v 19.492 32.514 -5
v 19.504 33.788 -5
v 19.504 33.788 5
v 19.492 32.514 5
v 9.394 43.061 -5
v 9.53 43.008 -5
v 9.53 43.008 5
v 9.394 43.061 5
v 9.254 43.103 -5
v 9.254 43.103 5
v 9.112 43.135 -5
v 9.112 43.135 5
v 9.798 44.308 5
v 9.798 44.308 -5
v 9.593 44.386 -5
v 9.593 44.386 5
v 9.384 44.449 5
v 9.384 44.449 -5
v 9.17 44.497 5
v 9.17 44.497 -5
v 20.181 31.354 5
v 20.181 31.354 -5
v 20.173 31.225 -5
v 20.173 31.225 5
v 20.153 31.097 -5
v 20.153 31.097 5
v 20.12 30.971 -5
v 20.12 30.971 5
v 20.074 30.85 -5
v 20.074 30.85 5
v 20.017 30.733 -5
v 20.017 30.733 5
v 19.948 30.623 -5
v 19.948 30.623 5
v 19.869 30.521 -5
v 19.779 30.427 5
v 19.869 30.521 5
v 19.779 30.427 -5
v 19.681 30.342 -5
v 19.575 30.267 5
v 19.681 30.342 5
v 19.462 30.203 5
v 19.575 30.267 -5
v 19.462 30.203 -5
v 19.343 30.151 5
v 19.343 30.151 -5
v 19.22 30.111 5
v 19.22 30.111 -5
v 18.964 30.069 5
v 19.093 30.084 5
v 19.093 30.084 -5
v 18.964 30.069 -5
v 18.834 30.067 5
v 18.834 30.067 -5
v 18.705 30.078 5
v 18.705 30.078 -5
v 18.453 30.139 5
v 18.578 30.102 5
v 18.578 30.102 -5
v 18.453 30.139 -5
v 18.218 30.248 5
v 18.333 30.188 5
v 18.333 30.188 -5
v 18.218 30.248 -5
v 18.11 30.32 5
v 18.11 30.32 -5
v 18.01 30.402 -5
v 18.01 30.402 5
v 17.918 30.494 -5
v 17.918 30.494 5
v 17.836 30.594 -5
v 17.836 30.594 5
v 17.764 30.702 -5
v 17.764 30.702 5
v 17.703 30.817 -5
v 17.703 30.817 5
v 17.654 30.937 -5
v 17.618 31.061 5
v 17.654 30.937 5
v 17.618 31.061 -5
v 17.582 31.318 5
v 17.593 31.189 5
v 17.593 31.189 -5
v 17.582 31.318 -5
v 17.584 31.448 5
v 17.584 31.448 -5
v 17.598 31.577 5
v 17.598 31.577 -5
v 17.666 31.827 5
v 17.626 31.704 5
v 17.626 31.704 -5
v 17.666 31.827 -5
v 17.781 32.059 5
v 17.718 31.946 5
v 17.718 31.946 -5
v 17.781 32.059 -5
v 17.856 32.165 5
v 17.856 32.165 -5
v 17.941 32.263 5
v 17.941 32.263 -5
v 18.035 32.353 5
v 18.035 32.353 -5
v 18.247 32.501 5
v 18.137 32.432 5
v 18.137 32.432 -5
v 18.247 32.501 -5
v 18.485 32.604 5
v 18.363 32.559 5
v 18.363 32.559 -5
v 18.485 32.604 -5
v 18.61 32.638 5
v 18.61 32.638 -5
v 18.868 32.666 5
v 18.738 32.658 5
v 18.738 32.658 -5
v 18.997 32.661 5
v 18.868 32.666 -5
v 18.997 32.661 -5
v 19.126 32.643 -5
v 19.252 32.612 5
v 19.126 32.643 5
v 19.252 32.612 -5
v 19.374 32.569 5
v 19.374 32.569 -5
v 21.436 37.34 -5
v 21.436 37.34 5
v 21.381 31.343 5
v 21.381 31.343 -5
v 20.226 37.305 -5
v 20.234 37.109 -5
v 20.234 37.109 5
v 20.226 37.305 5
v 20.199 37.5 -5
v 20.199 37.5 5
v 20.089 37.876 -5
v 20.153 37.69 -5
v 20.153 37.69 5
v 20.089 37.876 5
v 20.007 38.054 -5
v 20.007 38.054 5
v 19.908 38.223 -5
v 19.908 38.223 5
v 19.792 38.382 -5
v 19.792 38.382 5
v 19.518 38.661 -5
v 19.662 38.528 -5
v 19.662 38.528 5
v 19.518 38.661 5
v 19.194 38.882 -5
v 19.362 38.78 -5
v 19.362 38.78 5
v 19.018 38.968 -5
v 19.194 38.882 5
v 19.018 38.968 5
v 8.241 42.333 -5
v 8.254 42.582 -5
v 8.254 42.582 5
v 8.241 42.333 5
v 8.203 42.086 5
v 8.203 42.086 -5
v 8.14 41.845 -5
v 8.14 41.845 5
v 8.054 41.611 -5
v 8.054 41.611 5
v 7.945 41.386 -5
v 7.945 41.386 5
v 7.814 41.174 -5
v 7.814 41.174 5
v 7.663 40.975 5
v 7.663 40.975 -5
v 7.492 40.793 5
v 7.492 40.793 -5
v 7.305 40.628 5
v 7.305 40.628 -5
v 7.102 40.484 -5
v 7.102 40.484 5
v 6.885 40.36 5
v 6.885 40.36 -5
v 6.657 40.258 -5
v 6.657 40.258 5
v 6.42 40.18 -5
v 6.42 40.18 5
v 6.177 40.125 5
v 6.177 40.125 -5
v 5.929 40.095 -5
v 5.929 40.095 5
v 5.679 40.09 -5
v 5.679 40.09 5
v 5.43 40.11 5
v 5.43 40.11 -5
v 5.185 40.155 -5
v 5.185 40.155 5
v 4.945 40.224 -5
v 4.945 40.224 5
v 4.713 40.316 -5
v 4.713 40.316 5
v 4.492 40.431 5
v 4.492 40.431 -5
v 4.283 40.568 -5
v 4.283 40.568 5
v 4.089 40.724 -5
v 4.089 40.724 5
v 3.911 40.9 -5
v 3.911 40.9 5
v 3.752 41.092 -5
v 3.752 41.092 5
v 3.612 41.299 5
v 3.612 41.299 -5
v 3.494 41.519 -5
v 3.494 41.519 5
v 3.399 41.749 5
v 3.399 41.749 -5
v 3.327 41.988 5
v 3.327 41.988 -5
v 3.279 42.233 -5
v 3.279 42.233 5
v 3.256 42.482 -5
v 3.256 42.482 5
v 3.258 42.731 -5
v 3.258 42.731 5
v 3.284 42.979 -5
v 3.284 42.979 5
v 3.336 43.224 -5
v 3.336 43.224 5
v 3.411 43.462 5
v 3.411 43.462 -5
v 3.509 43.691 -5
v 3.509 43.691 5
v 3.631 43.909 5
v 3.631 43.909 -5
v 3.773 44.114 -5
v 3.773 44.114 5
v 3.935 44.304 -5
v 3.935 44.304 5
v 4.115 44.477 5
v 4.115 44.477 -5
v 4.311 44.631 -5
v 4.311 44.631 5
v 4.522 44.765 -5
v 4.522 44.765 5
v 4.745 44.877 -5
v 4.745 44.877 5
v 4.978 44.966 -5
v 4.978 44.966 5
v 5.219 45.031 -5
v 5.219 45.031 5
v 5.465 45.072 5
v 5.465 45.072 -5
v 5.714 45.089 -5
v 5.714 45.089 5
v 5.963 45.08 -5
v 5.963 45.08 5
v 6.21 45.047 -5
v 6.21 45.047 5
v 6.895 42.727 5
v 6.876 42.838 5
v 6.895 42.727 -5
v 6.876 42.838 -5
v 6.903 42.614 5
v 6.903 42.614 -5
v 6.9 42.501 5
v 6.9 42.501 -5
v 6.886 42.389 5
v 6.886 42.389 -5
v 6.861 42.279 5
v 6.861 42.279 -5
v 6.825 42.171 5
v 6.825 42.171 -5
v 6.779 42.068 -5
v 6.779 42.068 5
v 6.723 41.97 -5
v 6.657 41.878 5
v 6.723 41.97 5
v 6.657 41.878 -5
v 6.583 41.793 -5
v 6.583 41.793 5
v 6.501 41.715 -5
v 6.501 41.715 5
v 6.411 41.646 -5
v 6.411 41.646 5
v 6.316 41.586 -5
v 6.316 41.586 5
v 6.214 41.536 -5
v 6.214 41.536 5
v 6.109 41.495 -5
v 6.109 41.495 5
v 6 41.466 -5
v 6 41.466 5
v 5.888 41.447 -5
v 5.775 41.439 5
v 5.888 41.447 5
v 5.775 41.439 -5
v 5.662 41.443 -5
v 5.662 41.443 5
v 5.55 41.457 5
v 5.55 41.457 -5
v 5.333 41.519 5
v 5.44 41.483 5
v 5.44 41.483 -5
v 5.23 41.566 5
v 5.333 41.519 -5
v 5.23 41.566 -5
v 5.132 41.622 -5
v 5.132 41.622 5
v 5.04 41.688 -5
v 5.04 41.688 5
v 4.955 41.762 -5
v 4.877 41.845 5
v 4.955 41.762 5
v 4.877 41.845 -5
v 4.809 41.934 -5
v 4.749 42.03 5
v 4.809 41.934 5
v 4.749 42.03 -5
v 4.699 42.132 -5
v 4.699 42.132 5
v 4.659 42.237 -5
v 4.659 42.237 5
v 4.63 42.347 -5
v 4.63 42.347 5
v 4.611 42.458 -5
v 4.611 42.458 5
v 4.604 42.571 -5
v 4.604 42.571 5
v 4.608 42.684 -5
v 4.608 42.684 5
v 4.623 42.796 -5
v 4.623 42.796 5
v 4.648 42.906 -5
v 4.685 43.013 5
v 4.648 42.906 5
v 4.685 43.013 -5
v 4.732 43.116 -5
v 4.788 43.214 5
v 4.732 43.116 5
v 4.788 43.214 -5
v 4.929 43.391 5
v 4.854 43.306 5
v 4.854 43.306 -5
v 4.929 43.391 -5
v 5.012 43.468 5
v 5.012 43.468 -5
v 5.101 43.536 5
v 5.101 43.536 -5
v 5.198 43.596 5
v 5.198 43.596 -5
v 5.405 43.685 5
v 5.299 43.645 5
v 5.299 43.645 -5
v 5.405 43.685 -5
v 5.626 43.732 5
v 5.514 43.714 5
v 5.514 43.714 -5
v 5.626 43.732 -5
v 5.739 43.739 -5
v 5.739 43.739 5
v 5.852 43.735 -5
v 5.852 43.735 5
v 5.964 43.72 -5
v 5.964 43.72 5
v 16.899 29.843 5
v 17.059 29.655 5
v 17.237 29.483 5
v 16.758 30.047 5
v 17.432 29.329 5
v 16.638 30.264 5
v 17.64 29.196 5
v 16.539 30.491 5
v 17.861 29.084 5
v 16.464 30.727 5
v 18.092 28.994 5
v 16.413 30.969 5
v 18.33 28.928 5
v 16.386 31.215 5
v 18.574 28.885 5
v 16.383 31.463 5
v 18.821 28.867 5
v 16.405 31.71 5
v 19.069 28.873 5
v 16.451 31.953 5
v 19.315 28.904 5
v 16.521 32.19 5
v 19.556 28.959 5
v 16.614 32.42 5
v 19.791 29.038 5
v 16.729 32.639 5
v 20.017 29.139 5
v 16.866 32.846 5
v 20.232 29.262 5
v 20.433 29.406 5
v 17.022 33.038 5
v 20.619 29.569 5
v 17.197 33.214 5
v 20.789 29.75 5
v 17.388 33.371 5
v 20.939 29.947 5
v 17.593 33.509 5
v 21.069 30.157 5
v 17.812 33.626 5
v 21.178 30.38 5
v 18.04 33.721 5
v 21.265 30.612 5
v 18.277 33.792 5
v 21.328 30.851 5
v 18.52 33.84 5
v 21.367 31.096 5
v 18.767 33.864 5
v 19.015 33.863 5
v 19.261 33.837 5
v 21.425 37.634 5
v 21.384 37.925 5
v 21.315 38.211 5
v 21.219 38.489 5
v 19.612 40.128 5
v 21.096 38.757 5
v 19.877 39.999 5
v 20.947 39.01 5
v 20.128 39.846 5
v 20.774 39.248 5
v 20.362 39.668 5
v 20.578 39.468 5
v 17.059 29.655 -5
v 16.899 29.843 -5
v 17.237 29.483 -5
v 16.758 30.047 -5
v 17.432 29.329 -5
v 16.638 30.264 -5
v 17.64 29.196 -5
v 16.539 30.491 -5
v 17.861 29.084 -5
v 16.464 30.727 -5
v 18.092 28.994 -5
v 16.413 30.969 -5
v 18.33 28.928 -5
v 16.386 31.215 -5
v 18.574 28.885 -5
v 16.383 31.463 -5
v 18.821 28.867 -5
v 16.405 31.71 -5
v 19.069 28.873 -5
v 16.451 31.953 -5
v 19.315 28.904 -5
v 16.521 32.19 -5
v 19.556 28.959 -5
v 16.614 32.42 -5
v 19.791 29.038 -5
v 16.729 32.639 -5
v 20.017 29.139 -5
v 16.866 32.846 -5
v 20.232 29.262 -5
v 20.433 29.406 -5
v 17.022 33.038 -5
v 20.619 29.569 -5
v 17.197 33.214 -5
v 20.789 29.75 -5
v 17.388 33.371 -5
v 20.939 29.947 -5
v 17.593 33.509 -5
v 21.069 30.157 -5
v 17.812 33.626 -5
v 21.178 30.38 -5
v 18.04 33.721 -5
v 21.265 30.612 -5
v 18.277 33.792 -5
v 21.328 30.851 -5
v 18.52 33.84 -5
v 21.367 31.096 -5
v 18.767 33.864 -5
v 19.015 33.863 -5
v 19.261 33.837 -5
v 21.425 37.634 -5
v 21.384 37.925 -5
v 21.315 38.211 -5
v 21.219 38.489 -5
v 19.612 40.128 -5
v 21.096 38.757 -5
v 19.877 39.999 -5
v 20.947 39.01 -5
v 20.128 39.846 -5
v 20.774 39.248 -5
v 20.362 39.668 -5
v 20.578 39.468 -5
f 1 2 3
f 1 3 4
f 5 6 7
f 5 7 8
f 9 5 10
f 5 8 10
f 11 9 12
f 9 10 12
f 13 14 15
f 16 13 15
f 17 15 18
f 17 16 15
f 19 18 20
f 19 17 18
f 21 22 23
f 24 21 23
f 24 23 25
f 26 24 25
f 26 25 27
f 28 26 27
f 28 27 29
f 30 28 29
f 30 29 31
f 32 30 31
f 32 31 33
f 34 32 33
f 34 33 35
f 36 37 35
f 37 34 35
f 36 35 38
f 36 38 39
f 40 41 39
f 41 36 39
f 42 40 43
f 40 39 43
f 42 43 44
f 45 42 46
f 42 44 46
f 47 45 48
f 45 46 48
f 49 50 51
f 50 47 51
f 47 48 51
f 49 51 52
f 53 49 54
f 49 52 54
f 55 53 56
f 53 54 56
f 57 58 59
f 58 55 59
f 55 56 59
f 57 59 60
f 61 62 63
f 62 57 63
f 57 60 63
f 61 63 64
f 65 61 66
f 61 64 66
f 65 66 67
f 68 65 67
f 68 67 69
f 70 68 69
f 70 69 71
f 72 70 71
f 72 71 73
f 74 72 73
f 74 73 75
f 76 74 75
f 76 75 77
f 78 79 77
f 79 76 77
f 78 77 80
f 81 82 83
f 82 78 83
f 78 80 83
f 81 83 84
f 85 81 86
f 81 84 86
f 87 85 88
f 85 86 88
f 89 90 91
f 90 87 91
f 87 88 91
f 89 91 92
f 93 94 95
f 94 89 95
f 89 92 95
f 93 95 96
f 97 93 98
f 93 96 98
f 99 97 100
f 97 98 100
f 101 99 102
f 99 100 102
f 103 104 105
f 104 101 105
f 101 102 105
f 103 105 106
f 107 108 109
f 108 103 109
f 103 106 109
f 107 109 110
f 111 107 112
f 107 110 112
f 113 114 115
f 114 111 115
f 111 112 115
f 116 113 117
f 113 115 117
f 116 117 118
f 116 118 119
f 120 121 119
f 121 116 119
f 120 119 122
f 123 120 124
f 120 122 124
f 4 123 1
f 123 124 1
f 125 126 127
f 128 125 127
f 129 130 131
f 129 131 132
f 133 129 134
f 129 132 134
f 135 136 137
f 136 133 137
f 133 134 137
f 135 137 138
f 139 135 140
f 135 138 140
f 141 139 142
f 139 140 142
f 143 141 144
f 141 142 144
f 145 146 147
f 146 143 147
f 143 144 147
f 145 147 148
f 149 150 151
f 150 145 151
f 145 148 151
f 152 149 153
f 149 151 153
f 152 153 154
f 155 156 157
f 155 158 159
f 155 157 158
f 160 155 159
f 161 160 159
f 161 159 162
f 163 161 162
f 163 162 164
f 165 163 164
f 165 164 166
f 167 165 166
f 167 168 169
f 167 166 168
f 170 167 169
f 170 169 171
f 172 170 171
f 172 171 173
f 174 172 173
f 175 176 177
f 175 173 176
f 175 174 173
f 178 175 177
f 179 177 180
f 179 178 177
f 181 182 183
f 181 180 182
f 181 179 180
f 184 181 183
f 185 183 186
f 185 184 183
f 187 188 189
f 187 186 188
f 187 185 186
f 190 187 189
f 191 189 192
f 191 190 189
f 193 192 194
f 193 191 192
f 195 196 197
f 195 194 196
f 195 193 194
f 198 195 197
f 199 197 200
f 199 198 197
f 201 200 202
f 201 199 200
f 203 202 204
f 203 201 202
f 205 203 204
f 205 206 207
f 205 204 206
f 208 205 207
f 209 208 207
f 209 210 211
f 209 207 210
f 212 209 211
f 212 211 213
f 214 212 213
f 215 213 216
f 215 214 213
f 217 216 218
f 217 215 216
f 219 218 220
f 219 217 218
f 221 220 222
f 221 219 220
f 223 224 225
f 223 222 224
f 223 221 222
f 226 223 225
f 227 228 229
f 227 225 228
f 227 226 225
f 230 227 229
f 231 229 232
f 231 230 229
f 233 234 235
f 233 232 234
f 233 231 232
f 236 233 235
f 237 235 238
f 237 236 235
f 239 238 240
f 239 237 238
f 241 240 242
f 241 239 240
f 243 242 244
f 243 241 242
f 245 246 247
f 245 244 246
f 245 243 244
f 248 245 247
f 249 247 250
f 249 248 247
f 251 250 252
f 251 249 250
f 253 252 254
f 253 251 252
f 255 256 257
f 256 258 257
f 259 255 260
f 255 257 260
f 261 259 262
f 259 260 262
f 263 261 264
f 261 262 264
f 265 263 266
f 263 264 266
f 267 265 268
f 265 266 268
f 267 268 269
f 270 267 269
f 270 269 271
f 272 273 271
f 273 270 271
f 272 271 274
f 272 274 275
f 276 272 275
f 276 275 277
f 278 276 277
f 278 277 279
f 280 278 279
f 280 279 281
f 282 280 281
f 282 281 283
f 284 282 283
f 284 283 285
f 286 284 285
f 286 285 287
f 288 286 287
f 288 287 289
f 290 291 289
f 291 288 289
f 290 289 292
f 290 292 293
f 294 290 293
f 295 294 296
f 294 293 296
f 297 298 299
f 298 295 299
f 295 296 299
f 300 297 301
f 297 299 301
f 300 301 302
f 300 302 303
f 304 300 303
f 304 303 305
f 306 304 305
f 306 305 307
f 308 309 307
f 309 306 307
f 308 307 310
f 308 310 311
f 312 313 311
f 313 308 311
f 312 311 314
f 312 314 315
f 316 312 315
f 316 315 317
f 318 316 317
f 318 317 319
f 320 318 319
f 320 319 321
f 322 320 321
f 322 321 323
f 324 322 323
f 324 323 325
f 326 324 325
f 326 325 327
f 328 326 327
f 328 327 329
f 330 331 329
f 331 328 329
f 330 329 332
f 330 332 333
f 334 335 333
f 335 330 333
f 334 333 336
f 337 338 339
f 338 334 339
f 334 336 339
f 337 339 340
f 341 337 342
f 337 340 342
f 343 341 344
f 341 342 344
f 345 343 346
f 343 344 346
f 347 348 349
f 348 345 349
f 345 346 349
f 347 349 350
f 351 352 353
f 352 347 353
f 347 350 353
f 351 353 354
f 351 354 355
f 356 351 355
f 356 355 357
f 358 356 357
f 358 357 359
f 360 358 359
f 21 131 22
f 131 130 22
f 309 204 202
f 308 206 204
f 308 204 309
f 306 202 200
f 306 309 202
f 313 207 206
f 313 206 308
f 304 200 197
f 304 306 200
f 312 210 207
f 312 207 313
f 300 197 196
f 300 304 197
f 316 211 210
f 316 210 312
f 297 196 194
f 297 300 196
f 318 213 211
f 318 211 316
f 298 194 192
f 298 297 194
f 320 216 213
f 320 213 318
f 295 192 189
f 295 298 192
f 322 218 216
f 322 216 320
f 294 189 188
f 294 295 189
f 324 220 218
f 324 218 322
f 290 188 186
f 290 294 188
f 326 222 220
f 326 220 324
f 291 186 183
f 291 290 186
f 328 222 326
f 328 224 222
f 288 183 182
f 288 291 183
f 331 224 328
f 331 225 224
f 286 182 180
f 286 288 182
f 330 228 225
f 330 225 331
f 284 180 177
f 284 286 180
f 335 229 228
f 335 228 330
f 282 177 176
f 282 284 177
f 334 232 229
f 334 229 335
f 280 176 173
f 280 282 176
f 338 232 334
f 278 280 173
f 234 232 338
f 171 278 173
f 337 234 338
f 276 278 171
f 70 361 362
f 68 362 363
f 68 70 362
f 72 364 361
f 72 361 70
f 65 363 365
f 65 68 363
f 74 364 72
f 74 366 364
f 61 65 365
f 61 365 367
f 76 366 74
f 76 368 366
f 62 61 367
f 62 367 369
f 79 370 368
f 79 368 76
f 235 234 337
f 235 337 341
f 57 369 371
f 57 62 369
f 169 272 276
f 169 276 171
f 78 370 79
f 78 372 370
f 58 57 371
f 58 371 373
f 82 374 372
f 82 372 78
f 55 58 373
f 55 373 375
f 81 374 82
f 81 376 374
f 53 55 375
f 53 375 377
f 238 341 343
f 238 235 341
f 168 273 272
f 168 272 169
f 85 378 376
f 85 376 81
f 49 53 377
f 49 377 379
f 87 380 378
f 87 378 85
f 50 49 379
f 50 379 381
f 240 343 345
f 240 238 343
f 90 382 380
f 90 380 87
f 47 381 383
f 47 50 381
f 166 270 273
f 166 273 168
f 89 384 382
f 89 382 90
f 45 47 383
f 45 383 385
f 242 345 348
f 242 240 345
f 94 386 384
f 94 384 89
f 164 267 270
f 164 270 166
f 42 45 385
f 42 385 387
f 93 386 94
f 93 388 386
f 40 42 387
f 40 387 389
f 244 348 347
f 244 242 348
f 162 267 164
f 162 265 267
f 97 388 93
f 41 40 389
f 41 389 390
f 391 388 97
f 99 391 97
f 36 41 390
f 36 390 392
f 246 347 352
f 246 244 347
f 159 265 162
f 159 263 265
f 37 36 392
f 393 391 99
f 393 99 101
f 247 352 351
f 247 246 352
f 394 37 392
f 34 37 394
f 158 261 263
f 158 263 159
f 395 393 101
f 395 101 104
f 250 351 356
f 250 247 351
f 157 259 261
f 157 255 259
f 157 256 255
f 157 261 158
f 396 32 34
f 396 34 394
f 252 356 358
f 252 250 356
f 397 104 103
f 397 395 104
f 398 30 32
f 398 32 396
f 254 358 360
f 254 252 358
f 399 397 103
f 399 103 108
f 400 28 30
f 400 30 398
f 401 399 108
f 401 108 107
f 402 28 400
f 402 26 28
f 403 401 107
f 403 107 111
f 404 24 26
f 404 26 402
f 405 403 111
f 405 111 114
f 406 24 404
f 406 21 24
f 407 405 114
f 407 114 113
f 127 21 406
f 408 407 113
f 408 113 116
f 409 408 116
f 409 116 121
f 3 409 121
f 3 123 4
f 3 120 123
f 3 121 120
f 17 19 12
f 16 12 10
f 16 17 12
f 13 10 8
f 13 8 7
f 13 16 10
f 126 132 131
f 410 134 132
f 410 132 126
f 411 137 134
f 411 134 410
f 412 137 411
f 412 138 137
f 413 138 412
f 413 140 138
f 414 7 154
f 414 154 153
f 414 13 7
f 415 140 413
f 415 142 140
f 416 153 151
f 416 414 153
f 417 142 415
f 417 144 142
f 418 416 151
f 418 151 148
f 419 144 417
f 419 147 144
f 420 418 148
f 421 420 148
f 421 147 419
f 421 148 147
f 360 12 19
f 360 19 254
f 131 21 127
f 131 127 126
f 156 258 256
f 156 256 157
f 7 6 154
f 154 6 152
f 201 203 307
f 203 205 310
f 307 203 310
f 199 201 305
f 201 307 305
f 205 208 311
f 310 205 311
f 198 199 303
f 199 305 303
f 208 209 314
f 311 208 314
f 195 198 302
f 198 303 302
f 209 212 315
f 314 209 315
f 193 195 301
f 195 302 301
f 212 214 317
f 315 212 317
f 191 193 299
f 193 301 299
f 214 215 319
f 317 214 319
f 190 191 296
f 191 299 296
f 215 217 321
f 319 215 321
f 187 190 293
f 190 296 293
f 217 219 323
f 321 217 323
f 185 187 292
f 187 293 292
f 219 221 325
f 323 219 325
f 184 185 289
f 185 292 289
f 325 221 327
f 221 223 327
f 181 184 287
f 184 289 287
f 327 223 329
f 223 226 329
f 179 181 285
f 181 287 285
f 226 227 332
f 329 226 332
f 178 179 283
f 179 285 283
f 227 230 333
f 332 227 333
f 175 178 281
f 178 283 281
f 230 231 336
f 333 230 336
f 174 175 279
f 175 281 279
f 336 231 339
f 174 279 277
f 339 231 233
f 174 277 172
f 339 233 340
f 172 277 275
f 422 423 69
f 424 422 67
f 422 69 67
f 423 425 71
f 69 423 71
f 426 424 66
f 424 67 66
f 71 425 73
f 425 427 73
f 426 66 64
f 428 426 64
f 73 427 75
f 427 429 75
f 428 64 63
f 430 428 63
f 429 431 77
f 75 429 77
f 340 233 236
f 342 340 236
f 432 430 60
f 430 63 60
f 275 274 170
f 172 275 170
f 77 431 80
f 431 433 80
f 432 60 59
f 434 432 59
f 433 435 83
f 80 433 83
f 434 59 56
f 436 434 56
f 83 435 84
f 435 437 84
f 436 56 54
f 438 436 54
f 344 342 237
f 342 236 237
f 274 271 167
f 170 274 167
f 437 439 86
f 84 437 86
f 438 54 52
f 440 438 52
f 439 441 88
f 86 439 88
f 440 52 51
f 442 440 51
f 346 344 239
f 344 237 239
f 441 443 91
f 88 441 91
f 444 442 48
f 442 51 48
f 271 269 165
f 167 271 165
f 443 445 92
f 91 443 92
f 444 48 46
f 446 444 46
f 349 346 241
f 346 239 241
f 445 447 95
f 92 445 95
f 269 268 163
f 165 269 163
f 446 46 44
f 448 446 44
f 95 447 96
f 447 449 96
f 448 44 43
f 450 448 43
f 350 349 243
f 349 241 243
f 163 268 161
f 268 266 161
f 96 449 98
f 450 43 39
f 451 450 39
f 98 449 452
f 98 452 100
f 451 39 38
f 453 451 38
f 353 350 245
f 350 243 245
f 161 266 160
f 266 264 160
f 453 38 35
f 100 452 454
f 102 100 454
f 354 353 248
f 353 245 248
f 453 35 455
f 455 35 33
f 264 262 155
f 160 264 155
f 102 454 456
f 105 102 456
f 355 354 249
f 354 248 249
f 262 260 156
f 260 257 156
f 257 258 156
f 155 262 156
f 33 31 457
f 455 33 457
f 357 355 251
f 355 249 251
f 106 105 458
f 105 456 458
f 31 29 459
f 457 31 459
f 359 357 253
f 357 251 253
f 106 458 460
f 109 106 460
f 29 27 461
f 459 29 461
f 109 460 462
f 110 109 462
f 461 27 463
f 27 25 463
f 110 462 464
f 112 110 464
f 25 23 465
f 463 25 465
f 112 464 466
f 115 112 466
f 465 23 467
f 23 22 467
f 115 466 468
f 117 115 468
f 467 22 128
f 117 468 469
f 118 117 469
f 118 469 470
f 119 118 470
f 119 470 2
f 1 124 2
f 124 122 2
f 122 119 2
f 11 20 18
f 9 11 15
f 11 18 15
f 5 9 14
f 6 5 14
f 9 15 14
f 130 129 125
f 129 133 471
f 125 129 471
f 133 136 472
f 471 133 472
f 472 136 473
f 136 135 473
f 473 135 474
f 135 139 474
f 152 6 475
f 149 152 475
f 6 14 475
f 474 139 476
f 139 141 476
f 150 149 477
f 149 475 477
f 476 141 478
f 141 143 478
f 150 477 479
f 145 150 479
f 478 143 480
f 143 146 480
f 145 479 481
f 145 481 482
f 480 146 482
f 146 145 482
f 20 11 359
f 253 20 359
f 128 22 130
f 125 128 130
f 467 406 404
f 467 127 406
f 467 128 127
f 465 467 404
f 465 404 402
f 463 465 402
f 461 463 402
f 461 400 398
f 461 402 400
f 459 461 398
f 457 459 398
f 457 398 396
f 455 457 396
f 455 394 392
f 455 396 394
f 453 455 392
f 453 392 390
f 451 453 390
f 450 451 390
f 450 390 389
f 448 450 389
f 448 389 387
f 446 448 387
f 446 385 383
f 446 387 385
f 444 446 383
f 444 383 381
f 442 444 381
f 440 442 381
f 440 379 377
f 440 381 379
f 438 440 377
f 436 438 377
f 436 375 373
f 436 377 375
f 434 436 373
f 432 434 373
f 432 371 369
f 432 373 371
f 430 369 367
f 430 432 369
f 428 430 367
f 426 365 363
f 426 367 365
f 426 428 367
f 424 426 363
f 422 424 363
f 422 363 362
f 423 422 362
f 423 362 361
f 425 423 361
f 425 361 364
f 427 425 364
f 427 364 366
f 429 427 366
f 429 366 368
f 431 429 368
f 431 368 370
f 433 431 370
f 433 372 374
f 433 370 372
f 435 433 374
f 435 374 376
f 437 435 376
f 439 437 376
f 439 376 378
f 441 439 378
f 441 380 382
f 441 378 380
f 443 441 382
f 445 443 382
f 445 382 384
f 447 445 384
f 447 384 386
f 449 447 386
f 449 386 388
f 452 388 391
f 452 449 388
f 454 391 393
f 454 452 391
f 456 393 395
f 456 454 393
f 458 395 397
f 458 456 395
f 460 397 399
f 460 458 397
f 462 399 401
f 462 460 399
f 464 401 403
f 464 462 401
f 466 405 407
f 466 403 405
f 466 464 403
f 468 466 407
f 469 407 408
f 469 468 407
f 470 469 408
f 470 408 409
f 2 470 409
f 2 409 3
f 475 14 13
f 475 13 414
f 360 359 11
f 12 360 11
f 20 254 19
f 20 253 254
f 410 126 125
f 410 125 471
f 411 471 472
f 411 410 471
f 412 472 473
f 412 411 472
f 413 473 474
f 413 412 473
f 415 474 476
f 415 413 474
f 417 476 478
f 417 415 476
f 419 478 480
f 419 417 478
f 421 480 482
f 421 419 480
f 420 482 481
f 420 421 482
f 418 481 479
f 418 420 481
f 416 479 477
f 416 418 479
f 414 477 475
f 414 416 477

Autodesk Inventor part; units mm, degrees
ref_plane "YZ Plane" through (0, 0, 0) normal (1, 0, 0) x (0, 1, 0)
ref_plane "XZ Plane" through (0, 0, 0) normal (0, 1, 0) x (-1, 0, 0)
ref_plane "XY Plane" through (0, 0, 0) normal (0, 0, 1) x (1, 0, 0)
sketch "Sketch1" plane through (0, 0, 0) normal (0, 0, 1) x (1, 0, 0)
  arc A0 (5.9638, 43.7198) -> (6.8764, 42.8382) centre (5.7537, 42.5892) ccw
  arc A1 (6.2105, 45.0471) -> (8.2537, 42.5823) centre (5.7537, 42.5892) ccw
  arc A2 (19.5035, 33.7876) -> (21.3811, 31.3432) centre (18.8812, 31.3663) ccw
  line L0 (6.2105, 45.0471) -> (9.4943, 44.4368)
  line L1 (9.4943, 44.4368) -> (21.4548, 39.3429)
  line L2 (21.4548, 39.3429) -> (21.3811, 31.3432)
  line L3 (5.9638, 43.7198) -> (9.3282, 43.0946)
  line L4 (9.3282, 43.0946) -> (20.2464, 38.4445)
  line L5 (20.2464, 38.4445) -> (20.1811, 31.3543)
  line L6 (6.8764, 42.8382) -> (8.2537, 42.5823)
  line L7 (19.5035, 33.7876) -> (19.4918, 32.5139)
  arc A3 (19.4918, 32.5139) -> (20.1811, 31.3543) centre (18.8812, 31.3663) ccw
  line L8 (5.7537, 42.5892) -> (18.8812, 31.3663) construction
  circle A4 centre (5.7537, 42.5892) radius 1.2
  point P0 (0, 0)
  dimension "d0" = 5
  dimension "d1" = 5
  dimension "d2" = 1.3
  dimension "d5" = 1.35
  dimension "d8" = 8
  dimension "d9" = 0.7
  dimension "d10" = 0.7
  dimension "d12" = 1.2
  dimension "d18" = 2.3
  dimension "d19" = 30
  dimension "d20" = 13
  dimension "d21" = 50
extrude "Extrusion1" add sketch "Sketch1" along normal mid plane 10 contours A0 L6 A4 L3 | A4 L6 A1 L0 L1 L2 A2 L7 A3 L5 L4 L3 picked at (6.096, 43.7118)
fillet "Fillet1" radius 2 2 edges at (20.2464, 38.4445, 0) (9.3282, 43.0946, 0)
fillet "Fillet1" radius 3 2 edges at (9.4943, 44.4368, 0) (21.4548, 39.3429, 0)
properties part number "Linkage for full overlay hinge" material "Steel"
